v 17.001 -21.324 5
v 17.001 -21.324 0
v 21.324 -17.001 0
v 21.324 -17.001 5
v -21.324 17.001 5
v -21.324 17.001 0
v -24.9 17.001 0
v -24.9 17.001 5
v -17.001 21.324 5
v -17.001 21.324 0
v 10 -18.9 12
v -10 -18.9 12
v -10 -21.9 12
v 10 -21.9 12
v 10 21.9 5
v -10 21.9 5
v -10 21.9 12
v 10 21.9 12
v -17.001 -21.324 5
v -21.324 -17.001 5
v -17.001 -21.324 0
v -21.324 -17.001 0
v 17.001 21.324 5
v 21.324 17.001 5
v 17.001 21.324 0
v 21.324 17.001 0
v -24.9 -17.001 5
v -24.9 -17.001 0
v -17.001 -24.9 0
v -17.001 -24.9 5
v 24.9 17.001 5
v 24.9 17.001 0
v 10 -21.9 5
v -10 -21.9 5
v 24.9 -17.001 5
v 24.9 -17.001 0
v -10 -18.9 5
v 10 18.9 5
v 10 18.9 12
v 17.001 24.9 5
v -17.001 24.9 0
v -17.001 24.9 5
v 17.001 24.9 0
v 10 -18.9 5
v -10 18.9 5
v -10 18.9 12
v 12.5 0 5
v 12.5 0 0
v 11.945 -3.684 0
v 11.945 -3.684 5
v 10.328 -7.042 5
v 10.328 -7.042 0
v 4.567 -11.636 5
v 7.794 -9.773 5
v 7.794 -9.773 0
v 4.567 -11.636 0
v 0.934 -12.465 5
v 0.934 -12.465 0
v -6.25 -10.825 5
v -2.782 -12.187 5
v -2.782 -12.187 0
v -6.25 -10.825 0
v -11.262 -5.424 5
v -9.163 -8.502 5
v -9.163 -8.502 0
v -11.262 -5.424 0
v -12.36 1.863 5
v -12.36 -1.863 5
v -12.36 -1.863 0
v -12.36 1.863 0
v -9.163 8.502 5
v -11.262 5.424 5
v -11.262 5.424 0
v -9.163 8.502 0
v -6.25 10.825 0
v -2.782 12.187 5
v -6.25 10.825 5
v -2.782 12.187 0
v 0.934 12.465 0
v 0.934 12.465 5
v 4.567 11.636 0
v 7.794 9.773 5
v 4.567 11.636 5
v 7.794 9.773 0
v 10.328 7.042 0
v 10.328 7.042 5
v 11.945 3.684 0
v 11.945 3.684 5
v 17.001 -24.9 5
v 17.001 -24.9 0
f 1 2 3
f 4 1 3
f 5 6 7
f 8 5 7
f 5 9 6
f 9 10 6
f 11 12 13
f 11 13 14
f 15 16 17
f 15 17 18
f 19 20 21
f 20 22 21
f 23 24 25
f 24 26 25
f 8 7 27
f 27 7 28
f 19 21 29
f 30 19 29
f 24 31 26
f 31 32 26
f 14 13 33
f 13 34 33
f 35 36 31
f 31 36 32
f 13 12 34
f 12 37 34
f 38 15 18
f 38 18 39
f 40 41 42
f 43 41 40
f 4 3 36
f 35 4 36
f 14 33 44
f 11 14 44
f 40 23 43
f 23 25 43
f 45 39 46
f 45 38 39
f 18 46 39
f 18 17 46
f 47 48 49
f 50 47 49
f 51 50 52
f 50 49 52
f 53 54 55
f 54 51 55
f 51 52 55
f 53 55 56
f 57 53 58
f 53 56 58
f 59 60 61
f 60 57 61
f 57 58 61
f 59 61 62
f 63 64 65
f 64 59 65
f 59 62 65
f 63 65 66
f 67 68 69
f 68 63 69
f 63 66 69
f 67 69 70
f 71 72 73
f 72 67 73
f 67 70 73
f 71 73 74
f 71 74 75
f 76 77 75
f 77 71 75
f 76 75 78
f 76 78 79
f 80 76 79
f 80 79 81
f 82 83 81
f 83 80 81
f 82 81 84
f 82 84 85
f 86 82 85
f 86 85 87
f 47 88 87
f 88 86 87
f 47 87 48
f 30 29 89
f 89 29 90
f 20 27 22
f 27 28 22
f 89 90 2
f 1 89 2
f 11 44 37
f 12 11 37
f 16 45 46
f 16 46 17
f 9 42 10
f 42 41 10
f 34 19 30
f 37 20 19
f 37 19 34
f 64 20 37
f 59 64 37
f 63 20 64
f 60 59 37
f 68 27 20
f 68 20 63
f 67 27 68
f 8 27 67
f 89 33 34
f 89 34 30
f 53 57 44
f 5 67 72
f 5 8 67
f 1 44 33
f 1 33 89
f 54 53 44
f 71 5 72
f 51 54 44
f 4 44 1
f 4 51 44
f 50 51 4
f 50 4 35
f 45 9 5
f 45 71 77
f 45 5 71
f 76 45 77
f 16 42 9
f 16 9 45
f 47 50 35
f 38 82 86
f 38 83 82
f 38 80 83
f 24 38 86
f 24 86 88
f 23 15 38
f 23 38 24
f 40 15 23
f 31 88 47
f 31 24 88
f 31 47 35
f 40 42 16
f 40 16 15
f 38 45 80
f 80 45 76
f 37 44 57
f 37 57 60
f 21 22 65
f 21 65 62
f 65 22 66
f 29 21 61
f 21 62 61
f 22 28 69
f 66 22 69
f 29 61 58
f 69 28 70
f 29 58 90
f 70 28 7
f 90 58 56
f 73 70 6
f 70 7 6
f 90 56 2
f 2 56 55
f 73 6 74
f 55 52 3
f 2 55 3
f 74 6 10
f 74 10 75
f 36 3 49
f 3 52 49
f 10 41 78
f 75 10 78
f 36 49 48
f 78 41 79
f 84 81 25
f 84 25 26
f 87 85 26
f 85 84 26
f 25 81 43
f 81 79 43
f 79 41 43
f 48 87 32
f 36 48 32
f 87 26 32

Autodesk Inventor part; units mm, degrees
ref_plane "YZ Plane" through (0, 0, 0) normal (1, 0, 0) x (0, 1, 0)
ref_plane "XZ Plane" through (0, 0, 0) normal (0, 1, 0) x (-1, 0, 0)
ref_plane "XY Plane" through (0, 0, 0) normal (0, 0, 1) x (1, 0, 0)
sketch "Sketch1" plane through (0, 0, 0) normal (0, 0, 1) x (1, 0, 0)
  line L0 (-34.86, 0) -> (34.86, 0) construction
  line L1 (0, -34.86) -> (0, 34.86) construction
  line L2 (0, 0) -> (11.1575, 11.1575) construction
  line L3 (0, 0) -> (15.7791, 0) construction
  line L4 (0, 24.9) -> (16.8009, 24.9)
  line L5 (16.8009, 24.9) -> (16.8009, 21.2415)
  line L6 (16.8009, 21.2415) -> (19.0212, 19.0212)
  line L7 (24.9, 0) -> (24.9, 16.8009)
  line L8 (24.9, 16.8009) -> (21.2415, 16.8009)
  line L9 (21.2415, 16.8009) -> (19.0212, 19.0212)
  line L10 (0, -24.9) -> (16.8009, -24.9)
  line L11 (16.8009, -24.9) -> (16.8009, -21.2415)
  line L12 (16.8009, -21.2415) -> (19.0212, -19.0212)
  line L13 (24.9, 0) -> (24.9, -16.8009)
  line L14 (24.9, -16.8009) -> (21.2415, -16.8009)
  line L15 (21.2415, -16.8009) -> (19.0212, -19.0212)
  line L16 (0, 24.9) -> (-16.8009, 24.9)
  line L17 (-16.8009, 24.9) -> (-16.8009, 21.2415)
  line L18 (-16.8009, 21.2415) -> (-19.0212, 19.0212)
  line L19 (-24.9, 16.8009) -> (-21.2415, 16.8009)
  line L20 (-21.2415, 16.8009) -> (-19.0212, 19.0212)
  line L21 (0, -24.9) -> (-16.8009, -24.9)
  line L22 (-16.8009, -24.9) -> (-16.8009, -21.2415)
  line L23 (-16.8009, -21.2415) -> (-19.0212, -19.0212)
  line L24 (-21.2415, -16.8009) -> (-19.0212, -19.0212)
  line L25 (-24.9, -16.8009) -> (-21.2415, -16.8009)
  line L26 (-24.9, 0) -> (-24.9, -16.8009)
  line L27 (-24.9, 0) -> (-24.9, 16.8009)
  circle A0 centre (0, 0) radius 12.5
  dimension "d0" = 45
  dimension "d2" = 24.9
  dimension "d3" = 3.14
  dimension "d4" = 26.9
  dimension "d5" = 25
extrude "Extrusion1" add sketch "Sketch1" along normal blind 5
sketch "Sketch2" plane through (0, 0, 5) normal (0, 0, 1) x (1, 0, 0)
  circle A0 centre (0, 0) radius 12.5 projected
  line L0 (16.8009, 24.9) -> (-16.8009, 24.9) projected
  line L1 (-16.8009, 24.9) -> (-16.8009, 21.2415) projected
  line L2 (-16.8009, 21.2415) -> (-21.2415, 16.8009) projected
  line L3 (-21.2415, 16.8009) -> (-24.9, 16.8009) projected
  line L4 (-24.9, 16.8009) -> (-24.9, -16.8009) projected
  line L5 (-24.9, -16.8009) -> (-21.2415, -16.8009) projected
  line L6 (-21.2415, -16.8009) -> (-16.8009, -21.2415) projected
  line L7 (-16.8009, -21.2415) -> (-16.8009, -24.9) projected
  line L8 (-16.8009, -24.9) -> (16.8009, -24.9) projected
  line L9 (16.8009, -24.9) -> (16.8009, -21.2415) projected
  line L10 (16.8009, -21.2415) -> (21.2415, -16.8009) projected
  line L11 (21.2415, -16.8009) -> (24.9, -16.8009) projected
  line L12 (24.9, -16.8009) -> (24.9, 16.8009) projected
  line L13 (24.9, 16.8009) -> (21.2415, 16.8009) projected
  line L14 (21.2415, 16.8009) -> (16.8009, 21.2415) projected
  line L15 (16.8009, 21.2415) -> (16.8009, 24.9) projected
  line L16 (-34.86, 0) -> (34.86, 0) construction
  line L17 (0, -34.86) -> (0, 34.86) construction
  line L18 (-10, 21.9) -> (10, 21.9)
  line L19 (10, 21.9) -> (10, 18.9)
  line L20 (10, 18.9) -> (-10, 18.9)
  line L21 (-10, 18.9) -> (-10, 21.9)
  line L22 (-10, -21.9) -> (10, -21.9)
  line L23 (10, -21.9) -> (10, -18.9)
  line L24 (10, -18.9) -> (-10, -18.9)
  line L25 (-10, -18.9) -> (-10, -21.9)
  dimension "d8" = 20
  dimension "d9" = 3
  dimension "d10" = 3
extrude "Extrusion2" add sketch "Sketch2" along normal blind 7 contours L18 L19 L20 L21 | L25 L24 L23 L22
chamfer "Fase1" [suppressed]
chamfer "Fase2" [suppressed]
sketch "Sketch4" plane through (0, 0, 0) normal (0, 0, -1) x (-1, 0, 0)
  circle A0 centre (0, 0) radius 12.5 construction
  line L0 (16.8009, 24.9) -> (-16.8009, 24.9) construction
  line L1 (-16.8009, 24.9) -> (-16.8009, 21.2415) projected
  line L2 (-16.8009, 21.2415) -> (-21.2415, 16.8009) projected
  line L3 (-21.2415, 16.8009) -> (-24.9, 16.8009) projected
  line L4 (-24.9, 16.8009) -> (-24.9, -16.8009) construction
  line L5 (-24.9, -16.8009) -> (-21.2415, -16.8009) projected
  line L6 (-21.2415, -16.8009) -> (-16.8009, -21.2415) projected
  line L7 (-16.8009, -21.2415) -> (-16.8009, -24.9) projected
  line L8 (-16.8009, -24.9) -> (16.8009, -24.9) construction
  line L9 (16.8009, -24.9) -> (16.8009, -21.2415) projected
  line L10 (16.8009, -21.2415) -> (21.2415, -16.8009) projected
  line L11 (21.2415, -16.8009) -> (24.9, -16.8009) projected
  line L12 (24.9, -16.8009) -> (24.9, 16.8009) construction
  line L13 (24.9, 16.8009) -> (21.2415, 16.8009) projected
  line L14 (21.2415, 16.8009) -> (16.8009, 21.2415) projected
  line L15 (16.8009, 21.2415) -> (16.8009, 24.9) projected
  line L16 (-17.0009, 25.1) -> (17.0009, 25.1) construction
  line L17 (17.0009, 25.1) -> (17.0009, 21.3243)
  line L18 (17.0009, 21.3243) -> (21.3243, 17.0009)
  line L19 (21.3243, 17.0009) -> (25.1, 17.0009)
  line L20 (25.1, 17.0009) -> (25.1, -17.0009) construction
  line L21 (25.1, -17.0009) -> (21.3243, -17.0009)
  line L22 (21.3243, -17.0009) -> (17.0009, -21.3243)
  line L23 (17.0009, -21.3243) -> (17.0009, -25.1)
  line L24 (17.0009, -25.1) -> (-17.0009, -25.1) construction
  line L25 (-17.0009, -25.1) -> (-17.0009, -21.3243)
  line L26 (-17.0009, -21.3243) -> (-21.3243, -17.0009)
  line L27 (-21.3243, -17.0009) -> (-25.1, -17.0009)
  line L28 (-25.1, -17.0009) -> (-25.1, 17.0009) construction
  line L29 (-25.1, 17.0009) -> (-21.3243, 17.0009)
  line L30 (-21.3243, 17.0009) -> (-17.0009, 21.3243)
  line L31 (-17.0009, 21.3243) -> (-17.0009, 25.1)
  line L32 (-24.9, -16.8009) -> (-24.9, 16.8009) projected
  line L33 (-24.9, 16.8009) -> (-24.9, 17.0009)
  line L34 (-16.8009, 24.9) -> (-17.0009, 24.9)
  line L35 (-16.8009, 24.9) -> (16.8009, 24.9) projected
  line L36 (16.8009, 24.9) -> (17.0009, 24.9)
  line L37 (24.9, 16.8009) -> (24.9, 17.0009)
  line L38 (24.9, 16.8009) -> (24.9, -16.8009) projected
  line L39 (24.9, -16.8009) -> (24.9, -17.0009)
  line L40 (16.8009, -24.9) -> (-16.8009, -24.9) projected
  line L41 (16.8009, -24.9) -> (17.0009, -24.9)
  line L42 (-16.8009, -24.9) -> (-17.0009, -24.9)
  line L43 (-24.9, -16.8009) -> (-24.9, -17.0009)
  dimension "d19" = 0.2
extrude "IM_offset" add sketch "Sketch4" against normal up to surface (5 mm away) contours L1 L2 L3 L33 L29 L30 L31 L34 | L36 L17 L18 L19 L37 L13 L14 L15 | L5 L6 L7 L42 L25 L26 L27 L43 | L39 L21 L22 L23 L41 L9 L10 L11
properties part number "20_Cube_insert_Sample_holder_v3"
